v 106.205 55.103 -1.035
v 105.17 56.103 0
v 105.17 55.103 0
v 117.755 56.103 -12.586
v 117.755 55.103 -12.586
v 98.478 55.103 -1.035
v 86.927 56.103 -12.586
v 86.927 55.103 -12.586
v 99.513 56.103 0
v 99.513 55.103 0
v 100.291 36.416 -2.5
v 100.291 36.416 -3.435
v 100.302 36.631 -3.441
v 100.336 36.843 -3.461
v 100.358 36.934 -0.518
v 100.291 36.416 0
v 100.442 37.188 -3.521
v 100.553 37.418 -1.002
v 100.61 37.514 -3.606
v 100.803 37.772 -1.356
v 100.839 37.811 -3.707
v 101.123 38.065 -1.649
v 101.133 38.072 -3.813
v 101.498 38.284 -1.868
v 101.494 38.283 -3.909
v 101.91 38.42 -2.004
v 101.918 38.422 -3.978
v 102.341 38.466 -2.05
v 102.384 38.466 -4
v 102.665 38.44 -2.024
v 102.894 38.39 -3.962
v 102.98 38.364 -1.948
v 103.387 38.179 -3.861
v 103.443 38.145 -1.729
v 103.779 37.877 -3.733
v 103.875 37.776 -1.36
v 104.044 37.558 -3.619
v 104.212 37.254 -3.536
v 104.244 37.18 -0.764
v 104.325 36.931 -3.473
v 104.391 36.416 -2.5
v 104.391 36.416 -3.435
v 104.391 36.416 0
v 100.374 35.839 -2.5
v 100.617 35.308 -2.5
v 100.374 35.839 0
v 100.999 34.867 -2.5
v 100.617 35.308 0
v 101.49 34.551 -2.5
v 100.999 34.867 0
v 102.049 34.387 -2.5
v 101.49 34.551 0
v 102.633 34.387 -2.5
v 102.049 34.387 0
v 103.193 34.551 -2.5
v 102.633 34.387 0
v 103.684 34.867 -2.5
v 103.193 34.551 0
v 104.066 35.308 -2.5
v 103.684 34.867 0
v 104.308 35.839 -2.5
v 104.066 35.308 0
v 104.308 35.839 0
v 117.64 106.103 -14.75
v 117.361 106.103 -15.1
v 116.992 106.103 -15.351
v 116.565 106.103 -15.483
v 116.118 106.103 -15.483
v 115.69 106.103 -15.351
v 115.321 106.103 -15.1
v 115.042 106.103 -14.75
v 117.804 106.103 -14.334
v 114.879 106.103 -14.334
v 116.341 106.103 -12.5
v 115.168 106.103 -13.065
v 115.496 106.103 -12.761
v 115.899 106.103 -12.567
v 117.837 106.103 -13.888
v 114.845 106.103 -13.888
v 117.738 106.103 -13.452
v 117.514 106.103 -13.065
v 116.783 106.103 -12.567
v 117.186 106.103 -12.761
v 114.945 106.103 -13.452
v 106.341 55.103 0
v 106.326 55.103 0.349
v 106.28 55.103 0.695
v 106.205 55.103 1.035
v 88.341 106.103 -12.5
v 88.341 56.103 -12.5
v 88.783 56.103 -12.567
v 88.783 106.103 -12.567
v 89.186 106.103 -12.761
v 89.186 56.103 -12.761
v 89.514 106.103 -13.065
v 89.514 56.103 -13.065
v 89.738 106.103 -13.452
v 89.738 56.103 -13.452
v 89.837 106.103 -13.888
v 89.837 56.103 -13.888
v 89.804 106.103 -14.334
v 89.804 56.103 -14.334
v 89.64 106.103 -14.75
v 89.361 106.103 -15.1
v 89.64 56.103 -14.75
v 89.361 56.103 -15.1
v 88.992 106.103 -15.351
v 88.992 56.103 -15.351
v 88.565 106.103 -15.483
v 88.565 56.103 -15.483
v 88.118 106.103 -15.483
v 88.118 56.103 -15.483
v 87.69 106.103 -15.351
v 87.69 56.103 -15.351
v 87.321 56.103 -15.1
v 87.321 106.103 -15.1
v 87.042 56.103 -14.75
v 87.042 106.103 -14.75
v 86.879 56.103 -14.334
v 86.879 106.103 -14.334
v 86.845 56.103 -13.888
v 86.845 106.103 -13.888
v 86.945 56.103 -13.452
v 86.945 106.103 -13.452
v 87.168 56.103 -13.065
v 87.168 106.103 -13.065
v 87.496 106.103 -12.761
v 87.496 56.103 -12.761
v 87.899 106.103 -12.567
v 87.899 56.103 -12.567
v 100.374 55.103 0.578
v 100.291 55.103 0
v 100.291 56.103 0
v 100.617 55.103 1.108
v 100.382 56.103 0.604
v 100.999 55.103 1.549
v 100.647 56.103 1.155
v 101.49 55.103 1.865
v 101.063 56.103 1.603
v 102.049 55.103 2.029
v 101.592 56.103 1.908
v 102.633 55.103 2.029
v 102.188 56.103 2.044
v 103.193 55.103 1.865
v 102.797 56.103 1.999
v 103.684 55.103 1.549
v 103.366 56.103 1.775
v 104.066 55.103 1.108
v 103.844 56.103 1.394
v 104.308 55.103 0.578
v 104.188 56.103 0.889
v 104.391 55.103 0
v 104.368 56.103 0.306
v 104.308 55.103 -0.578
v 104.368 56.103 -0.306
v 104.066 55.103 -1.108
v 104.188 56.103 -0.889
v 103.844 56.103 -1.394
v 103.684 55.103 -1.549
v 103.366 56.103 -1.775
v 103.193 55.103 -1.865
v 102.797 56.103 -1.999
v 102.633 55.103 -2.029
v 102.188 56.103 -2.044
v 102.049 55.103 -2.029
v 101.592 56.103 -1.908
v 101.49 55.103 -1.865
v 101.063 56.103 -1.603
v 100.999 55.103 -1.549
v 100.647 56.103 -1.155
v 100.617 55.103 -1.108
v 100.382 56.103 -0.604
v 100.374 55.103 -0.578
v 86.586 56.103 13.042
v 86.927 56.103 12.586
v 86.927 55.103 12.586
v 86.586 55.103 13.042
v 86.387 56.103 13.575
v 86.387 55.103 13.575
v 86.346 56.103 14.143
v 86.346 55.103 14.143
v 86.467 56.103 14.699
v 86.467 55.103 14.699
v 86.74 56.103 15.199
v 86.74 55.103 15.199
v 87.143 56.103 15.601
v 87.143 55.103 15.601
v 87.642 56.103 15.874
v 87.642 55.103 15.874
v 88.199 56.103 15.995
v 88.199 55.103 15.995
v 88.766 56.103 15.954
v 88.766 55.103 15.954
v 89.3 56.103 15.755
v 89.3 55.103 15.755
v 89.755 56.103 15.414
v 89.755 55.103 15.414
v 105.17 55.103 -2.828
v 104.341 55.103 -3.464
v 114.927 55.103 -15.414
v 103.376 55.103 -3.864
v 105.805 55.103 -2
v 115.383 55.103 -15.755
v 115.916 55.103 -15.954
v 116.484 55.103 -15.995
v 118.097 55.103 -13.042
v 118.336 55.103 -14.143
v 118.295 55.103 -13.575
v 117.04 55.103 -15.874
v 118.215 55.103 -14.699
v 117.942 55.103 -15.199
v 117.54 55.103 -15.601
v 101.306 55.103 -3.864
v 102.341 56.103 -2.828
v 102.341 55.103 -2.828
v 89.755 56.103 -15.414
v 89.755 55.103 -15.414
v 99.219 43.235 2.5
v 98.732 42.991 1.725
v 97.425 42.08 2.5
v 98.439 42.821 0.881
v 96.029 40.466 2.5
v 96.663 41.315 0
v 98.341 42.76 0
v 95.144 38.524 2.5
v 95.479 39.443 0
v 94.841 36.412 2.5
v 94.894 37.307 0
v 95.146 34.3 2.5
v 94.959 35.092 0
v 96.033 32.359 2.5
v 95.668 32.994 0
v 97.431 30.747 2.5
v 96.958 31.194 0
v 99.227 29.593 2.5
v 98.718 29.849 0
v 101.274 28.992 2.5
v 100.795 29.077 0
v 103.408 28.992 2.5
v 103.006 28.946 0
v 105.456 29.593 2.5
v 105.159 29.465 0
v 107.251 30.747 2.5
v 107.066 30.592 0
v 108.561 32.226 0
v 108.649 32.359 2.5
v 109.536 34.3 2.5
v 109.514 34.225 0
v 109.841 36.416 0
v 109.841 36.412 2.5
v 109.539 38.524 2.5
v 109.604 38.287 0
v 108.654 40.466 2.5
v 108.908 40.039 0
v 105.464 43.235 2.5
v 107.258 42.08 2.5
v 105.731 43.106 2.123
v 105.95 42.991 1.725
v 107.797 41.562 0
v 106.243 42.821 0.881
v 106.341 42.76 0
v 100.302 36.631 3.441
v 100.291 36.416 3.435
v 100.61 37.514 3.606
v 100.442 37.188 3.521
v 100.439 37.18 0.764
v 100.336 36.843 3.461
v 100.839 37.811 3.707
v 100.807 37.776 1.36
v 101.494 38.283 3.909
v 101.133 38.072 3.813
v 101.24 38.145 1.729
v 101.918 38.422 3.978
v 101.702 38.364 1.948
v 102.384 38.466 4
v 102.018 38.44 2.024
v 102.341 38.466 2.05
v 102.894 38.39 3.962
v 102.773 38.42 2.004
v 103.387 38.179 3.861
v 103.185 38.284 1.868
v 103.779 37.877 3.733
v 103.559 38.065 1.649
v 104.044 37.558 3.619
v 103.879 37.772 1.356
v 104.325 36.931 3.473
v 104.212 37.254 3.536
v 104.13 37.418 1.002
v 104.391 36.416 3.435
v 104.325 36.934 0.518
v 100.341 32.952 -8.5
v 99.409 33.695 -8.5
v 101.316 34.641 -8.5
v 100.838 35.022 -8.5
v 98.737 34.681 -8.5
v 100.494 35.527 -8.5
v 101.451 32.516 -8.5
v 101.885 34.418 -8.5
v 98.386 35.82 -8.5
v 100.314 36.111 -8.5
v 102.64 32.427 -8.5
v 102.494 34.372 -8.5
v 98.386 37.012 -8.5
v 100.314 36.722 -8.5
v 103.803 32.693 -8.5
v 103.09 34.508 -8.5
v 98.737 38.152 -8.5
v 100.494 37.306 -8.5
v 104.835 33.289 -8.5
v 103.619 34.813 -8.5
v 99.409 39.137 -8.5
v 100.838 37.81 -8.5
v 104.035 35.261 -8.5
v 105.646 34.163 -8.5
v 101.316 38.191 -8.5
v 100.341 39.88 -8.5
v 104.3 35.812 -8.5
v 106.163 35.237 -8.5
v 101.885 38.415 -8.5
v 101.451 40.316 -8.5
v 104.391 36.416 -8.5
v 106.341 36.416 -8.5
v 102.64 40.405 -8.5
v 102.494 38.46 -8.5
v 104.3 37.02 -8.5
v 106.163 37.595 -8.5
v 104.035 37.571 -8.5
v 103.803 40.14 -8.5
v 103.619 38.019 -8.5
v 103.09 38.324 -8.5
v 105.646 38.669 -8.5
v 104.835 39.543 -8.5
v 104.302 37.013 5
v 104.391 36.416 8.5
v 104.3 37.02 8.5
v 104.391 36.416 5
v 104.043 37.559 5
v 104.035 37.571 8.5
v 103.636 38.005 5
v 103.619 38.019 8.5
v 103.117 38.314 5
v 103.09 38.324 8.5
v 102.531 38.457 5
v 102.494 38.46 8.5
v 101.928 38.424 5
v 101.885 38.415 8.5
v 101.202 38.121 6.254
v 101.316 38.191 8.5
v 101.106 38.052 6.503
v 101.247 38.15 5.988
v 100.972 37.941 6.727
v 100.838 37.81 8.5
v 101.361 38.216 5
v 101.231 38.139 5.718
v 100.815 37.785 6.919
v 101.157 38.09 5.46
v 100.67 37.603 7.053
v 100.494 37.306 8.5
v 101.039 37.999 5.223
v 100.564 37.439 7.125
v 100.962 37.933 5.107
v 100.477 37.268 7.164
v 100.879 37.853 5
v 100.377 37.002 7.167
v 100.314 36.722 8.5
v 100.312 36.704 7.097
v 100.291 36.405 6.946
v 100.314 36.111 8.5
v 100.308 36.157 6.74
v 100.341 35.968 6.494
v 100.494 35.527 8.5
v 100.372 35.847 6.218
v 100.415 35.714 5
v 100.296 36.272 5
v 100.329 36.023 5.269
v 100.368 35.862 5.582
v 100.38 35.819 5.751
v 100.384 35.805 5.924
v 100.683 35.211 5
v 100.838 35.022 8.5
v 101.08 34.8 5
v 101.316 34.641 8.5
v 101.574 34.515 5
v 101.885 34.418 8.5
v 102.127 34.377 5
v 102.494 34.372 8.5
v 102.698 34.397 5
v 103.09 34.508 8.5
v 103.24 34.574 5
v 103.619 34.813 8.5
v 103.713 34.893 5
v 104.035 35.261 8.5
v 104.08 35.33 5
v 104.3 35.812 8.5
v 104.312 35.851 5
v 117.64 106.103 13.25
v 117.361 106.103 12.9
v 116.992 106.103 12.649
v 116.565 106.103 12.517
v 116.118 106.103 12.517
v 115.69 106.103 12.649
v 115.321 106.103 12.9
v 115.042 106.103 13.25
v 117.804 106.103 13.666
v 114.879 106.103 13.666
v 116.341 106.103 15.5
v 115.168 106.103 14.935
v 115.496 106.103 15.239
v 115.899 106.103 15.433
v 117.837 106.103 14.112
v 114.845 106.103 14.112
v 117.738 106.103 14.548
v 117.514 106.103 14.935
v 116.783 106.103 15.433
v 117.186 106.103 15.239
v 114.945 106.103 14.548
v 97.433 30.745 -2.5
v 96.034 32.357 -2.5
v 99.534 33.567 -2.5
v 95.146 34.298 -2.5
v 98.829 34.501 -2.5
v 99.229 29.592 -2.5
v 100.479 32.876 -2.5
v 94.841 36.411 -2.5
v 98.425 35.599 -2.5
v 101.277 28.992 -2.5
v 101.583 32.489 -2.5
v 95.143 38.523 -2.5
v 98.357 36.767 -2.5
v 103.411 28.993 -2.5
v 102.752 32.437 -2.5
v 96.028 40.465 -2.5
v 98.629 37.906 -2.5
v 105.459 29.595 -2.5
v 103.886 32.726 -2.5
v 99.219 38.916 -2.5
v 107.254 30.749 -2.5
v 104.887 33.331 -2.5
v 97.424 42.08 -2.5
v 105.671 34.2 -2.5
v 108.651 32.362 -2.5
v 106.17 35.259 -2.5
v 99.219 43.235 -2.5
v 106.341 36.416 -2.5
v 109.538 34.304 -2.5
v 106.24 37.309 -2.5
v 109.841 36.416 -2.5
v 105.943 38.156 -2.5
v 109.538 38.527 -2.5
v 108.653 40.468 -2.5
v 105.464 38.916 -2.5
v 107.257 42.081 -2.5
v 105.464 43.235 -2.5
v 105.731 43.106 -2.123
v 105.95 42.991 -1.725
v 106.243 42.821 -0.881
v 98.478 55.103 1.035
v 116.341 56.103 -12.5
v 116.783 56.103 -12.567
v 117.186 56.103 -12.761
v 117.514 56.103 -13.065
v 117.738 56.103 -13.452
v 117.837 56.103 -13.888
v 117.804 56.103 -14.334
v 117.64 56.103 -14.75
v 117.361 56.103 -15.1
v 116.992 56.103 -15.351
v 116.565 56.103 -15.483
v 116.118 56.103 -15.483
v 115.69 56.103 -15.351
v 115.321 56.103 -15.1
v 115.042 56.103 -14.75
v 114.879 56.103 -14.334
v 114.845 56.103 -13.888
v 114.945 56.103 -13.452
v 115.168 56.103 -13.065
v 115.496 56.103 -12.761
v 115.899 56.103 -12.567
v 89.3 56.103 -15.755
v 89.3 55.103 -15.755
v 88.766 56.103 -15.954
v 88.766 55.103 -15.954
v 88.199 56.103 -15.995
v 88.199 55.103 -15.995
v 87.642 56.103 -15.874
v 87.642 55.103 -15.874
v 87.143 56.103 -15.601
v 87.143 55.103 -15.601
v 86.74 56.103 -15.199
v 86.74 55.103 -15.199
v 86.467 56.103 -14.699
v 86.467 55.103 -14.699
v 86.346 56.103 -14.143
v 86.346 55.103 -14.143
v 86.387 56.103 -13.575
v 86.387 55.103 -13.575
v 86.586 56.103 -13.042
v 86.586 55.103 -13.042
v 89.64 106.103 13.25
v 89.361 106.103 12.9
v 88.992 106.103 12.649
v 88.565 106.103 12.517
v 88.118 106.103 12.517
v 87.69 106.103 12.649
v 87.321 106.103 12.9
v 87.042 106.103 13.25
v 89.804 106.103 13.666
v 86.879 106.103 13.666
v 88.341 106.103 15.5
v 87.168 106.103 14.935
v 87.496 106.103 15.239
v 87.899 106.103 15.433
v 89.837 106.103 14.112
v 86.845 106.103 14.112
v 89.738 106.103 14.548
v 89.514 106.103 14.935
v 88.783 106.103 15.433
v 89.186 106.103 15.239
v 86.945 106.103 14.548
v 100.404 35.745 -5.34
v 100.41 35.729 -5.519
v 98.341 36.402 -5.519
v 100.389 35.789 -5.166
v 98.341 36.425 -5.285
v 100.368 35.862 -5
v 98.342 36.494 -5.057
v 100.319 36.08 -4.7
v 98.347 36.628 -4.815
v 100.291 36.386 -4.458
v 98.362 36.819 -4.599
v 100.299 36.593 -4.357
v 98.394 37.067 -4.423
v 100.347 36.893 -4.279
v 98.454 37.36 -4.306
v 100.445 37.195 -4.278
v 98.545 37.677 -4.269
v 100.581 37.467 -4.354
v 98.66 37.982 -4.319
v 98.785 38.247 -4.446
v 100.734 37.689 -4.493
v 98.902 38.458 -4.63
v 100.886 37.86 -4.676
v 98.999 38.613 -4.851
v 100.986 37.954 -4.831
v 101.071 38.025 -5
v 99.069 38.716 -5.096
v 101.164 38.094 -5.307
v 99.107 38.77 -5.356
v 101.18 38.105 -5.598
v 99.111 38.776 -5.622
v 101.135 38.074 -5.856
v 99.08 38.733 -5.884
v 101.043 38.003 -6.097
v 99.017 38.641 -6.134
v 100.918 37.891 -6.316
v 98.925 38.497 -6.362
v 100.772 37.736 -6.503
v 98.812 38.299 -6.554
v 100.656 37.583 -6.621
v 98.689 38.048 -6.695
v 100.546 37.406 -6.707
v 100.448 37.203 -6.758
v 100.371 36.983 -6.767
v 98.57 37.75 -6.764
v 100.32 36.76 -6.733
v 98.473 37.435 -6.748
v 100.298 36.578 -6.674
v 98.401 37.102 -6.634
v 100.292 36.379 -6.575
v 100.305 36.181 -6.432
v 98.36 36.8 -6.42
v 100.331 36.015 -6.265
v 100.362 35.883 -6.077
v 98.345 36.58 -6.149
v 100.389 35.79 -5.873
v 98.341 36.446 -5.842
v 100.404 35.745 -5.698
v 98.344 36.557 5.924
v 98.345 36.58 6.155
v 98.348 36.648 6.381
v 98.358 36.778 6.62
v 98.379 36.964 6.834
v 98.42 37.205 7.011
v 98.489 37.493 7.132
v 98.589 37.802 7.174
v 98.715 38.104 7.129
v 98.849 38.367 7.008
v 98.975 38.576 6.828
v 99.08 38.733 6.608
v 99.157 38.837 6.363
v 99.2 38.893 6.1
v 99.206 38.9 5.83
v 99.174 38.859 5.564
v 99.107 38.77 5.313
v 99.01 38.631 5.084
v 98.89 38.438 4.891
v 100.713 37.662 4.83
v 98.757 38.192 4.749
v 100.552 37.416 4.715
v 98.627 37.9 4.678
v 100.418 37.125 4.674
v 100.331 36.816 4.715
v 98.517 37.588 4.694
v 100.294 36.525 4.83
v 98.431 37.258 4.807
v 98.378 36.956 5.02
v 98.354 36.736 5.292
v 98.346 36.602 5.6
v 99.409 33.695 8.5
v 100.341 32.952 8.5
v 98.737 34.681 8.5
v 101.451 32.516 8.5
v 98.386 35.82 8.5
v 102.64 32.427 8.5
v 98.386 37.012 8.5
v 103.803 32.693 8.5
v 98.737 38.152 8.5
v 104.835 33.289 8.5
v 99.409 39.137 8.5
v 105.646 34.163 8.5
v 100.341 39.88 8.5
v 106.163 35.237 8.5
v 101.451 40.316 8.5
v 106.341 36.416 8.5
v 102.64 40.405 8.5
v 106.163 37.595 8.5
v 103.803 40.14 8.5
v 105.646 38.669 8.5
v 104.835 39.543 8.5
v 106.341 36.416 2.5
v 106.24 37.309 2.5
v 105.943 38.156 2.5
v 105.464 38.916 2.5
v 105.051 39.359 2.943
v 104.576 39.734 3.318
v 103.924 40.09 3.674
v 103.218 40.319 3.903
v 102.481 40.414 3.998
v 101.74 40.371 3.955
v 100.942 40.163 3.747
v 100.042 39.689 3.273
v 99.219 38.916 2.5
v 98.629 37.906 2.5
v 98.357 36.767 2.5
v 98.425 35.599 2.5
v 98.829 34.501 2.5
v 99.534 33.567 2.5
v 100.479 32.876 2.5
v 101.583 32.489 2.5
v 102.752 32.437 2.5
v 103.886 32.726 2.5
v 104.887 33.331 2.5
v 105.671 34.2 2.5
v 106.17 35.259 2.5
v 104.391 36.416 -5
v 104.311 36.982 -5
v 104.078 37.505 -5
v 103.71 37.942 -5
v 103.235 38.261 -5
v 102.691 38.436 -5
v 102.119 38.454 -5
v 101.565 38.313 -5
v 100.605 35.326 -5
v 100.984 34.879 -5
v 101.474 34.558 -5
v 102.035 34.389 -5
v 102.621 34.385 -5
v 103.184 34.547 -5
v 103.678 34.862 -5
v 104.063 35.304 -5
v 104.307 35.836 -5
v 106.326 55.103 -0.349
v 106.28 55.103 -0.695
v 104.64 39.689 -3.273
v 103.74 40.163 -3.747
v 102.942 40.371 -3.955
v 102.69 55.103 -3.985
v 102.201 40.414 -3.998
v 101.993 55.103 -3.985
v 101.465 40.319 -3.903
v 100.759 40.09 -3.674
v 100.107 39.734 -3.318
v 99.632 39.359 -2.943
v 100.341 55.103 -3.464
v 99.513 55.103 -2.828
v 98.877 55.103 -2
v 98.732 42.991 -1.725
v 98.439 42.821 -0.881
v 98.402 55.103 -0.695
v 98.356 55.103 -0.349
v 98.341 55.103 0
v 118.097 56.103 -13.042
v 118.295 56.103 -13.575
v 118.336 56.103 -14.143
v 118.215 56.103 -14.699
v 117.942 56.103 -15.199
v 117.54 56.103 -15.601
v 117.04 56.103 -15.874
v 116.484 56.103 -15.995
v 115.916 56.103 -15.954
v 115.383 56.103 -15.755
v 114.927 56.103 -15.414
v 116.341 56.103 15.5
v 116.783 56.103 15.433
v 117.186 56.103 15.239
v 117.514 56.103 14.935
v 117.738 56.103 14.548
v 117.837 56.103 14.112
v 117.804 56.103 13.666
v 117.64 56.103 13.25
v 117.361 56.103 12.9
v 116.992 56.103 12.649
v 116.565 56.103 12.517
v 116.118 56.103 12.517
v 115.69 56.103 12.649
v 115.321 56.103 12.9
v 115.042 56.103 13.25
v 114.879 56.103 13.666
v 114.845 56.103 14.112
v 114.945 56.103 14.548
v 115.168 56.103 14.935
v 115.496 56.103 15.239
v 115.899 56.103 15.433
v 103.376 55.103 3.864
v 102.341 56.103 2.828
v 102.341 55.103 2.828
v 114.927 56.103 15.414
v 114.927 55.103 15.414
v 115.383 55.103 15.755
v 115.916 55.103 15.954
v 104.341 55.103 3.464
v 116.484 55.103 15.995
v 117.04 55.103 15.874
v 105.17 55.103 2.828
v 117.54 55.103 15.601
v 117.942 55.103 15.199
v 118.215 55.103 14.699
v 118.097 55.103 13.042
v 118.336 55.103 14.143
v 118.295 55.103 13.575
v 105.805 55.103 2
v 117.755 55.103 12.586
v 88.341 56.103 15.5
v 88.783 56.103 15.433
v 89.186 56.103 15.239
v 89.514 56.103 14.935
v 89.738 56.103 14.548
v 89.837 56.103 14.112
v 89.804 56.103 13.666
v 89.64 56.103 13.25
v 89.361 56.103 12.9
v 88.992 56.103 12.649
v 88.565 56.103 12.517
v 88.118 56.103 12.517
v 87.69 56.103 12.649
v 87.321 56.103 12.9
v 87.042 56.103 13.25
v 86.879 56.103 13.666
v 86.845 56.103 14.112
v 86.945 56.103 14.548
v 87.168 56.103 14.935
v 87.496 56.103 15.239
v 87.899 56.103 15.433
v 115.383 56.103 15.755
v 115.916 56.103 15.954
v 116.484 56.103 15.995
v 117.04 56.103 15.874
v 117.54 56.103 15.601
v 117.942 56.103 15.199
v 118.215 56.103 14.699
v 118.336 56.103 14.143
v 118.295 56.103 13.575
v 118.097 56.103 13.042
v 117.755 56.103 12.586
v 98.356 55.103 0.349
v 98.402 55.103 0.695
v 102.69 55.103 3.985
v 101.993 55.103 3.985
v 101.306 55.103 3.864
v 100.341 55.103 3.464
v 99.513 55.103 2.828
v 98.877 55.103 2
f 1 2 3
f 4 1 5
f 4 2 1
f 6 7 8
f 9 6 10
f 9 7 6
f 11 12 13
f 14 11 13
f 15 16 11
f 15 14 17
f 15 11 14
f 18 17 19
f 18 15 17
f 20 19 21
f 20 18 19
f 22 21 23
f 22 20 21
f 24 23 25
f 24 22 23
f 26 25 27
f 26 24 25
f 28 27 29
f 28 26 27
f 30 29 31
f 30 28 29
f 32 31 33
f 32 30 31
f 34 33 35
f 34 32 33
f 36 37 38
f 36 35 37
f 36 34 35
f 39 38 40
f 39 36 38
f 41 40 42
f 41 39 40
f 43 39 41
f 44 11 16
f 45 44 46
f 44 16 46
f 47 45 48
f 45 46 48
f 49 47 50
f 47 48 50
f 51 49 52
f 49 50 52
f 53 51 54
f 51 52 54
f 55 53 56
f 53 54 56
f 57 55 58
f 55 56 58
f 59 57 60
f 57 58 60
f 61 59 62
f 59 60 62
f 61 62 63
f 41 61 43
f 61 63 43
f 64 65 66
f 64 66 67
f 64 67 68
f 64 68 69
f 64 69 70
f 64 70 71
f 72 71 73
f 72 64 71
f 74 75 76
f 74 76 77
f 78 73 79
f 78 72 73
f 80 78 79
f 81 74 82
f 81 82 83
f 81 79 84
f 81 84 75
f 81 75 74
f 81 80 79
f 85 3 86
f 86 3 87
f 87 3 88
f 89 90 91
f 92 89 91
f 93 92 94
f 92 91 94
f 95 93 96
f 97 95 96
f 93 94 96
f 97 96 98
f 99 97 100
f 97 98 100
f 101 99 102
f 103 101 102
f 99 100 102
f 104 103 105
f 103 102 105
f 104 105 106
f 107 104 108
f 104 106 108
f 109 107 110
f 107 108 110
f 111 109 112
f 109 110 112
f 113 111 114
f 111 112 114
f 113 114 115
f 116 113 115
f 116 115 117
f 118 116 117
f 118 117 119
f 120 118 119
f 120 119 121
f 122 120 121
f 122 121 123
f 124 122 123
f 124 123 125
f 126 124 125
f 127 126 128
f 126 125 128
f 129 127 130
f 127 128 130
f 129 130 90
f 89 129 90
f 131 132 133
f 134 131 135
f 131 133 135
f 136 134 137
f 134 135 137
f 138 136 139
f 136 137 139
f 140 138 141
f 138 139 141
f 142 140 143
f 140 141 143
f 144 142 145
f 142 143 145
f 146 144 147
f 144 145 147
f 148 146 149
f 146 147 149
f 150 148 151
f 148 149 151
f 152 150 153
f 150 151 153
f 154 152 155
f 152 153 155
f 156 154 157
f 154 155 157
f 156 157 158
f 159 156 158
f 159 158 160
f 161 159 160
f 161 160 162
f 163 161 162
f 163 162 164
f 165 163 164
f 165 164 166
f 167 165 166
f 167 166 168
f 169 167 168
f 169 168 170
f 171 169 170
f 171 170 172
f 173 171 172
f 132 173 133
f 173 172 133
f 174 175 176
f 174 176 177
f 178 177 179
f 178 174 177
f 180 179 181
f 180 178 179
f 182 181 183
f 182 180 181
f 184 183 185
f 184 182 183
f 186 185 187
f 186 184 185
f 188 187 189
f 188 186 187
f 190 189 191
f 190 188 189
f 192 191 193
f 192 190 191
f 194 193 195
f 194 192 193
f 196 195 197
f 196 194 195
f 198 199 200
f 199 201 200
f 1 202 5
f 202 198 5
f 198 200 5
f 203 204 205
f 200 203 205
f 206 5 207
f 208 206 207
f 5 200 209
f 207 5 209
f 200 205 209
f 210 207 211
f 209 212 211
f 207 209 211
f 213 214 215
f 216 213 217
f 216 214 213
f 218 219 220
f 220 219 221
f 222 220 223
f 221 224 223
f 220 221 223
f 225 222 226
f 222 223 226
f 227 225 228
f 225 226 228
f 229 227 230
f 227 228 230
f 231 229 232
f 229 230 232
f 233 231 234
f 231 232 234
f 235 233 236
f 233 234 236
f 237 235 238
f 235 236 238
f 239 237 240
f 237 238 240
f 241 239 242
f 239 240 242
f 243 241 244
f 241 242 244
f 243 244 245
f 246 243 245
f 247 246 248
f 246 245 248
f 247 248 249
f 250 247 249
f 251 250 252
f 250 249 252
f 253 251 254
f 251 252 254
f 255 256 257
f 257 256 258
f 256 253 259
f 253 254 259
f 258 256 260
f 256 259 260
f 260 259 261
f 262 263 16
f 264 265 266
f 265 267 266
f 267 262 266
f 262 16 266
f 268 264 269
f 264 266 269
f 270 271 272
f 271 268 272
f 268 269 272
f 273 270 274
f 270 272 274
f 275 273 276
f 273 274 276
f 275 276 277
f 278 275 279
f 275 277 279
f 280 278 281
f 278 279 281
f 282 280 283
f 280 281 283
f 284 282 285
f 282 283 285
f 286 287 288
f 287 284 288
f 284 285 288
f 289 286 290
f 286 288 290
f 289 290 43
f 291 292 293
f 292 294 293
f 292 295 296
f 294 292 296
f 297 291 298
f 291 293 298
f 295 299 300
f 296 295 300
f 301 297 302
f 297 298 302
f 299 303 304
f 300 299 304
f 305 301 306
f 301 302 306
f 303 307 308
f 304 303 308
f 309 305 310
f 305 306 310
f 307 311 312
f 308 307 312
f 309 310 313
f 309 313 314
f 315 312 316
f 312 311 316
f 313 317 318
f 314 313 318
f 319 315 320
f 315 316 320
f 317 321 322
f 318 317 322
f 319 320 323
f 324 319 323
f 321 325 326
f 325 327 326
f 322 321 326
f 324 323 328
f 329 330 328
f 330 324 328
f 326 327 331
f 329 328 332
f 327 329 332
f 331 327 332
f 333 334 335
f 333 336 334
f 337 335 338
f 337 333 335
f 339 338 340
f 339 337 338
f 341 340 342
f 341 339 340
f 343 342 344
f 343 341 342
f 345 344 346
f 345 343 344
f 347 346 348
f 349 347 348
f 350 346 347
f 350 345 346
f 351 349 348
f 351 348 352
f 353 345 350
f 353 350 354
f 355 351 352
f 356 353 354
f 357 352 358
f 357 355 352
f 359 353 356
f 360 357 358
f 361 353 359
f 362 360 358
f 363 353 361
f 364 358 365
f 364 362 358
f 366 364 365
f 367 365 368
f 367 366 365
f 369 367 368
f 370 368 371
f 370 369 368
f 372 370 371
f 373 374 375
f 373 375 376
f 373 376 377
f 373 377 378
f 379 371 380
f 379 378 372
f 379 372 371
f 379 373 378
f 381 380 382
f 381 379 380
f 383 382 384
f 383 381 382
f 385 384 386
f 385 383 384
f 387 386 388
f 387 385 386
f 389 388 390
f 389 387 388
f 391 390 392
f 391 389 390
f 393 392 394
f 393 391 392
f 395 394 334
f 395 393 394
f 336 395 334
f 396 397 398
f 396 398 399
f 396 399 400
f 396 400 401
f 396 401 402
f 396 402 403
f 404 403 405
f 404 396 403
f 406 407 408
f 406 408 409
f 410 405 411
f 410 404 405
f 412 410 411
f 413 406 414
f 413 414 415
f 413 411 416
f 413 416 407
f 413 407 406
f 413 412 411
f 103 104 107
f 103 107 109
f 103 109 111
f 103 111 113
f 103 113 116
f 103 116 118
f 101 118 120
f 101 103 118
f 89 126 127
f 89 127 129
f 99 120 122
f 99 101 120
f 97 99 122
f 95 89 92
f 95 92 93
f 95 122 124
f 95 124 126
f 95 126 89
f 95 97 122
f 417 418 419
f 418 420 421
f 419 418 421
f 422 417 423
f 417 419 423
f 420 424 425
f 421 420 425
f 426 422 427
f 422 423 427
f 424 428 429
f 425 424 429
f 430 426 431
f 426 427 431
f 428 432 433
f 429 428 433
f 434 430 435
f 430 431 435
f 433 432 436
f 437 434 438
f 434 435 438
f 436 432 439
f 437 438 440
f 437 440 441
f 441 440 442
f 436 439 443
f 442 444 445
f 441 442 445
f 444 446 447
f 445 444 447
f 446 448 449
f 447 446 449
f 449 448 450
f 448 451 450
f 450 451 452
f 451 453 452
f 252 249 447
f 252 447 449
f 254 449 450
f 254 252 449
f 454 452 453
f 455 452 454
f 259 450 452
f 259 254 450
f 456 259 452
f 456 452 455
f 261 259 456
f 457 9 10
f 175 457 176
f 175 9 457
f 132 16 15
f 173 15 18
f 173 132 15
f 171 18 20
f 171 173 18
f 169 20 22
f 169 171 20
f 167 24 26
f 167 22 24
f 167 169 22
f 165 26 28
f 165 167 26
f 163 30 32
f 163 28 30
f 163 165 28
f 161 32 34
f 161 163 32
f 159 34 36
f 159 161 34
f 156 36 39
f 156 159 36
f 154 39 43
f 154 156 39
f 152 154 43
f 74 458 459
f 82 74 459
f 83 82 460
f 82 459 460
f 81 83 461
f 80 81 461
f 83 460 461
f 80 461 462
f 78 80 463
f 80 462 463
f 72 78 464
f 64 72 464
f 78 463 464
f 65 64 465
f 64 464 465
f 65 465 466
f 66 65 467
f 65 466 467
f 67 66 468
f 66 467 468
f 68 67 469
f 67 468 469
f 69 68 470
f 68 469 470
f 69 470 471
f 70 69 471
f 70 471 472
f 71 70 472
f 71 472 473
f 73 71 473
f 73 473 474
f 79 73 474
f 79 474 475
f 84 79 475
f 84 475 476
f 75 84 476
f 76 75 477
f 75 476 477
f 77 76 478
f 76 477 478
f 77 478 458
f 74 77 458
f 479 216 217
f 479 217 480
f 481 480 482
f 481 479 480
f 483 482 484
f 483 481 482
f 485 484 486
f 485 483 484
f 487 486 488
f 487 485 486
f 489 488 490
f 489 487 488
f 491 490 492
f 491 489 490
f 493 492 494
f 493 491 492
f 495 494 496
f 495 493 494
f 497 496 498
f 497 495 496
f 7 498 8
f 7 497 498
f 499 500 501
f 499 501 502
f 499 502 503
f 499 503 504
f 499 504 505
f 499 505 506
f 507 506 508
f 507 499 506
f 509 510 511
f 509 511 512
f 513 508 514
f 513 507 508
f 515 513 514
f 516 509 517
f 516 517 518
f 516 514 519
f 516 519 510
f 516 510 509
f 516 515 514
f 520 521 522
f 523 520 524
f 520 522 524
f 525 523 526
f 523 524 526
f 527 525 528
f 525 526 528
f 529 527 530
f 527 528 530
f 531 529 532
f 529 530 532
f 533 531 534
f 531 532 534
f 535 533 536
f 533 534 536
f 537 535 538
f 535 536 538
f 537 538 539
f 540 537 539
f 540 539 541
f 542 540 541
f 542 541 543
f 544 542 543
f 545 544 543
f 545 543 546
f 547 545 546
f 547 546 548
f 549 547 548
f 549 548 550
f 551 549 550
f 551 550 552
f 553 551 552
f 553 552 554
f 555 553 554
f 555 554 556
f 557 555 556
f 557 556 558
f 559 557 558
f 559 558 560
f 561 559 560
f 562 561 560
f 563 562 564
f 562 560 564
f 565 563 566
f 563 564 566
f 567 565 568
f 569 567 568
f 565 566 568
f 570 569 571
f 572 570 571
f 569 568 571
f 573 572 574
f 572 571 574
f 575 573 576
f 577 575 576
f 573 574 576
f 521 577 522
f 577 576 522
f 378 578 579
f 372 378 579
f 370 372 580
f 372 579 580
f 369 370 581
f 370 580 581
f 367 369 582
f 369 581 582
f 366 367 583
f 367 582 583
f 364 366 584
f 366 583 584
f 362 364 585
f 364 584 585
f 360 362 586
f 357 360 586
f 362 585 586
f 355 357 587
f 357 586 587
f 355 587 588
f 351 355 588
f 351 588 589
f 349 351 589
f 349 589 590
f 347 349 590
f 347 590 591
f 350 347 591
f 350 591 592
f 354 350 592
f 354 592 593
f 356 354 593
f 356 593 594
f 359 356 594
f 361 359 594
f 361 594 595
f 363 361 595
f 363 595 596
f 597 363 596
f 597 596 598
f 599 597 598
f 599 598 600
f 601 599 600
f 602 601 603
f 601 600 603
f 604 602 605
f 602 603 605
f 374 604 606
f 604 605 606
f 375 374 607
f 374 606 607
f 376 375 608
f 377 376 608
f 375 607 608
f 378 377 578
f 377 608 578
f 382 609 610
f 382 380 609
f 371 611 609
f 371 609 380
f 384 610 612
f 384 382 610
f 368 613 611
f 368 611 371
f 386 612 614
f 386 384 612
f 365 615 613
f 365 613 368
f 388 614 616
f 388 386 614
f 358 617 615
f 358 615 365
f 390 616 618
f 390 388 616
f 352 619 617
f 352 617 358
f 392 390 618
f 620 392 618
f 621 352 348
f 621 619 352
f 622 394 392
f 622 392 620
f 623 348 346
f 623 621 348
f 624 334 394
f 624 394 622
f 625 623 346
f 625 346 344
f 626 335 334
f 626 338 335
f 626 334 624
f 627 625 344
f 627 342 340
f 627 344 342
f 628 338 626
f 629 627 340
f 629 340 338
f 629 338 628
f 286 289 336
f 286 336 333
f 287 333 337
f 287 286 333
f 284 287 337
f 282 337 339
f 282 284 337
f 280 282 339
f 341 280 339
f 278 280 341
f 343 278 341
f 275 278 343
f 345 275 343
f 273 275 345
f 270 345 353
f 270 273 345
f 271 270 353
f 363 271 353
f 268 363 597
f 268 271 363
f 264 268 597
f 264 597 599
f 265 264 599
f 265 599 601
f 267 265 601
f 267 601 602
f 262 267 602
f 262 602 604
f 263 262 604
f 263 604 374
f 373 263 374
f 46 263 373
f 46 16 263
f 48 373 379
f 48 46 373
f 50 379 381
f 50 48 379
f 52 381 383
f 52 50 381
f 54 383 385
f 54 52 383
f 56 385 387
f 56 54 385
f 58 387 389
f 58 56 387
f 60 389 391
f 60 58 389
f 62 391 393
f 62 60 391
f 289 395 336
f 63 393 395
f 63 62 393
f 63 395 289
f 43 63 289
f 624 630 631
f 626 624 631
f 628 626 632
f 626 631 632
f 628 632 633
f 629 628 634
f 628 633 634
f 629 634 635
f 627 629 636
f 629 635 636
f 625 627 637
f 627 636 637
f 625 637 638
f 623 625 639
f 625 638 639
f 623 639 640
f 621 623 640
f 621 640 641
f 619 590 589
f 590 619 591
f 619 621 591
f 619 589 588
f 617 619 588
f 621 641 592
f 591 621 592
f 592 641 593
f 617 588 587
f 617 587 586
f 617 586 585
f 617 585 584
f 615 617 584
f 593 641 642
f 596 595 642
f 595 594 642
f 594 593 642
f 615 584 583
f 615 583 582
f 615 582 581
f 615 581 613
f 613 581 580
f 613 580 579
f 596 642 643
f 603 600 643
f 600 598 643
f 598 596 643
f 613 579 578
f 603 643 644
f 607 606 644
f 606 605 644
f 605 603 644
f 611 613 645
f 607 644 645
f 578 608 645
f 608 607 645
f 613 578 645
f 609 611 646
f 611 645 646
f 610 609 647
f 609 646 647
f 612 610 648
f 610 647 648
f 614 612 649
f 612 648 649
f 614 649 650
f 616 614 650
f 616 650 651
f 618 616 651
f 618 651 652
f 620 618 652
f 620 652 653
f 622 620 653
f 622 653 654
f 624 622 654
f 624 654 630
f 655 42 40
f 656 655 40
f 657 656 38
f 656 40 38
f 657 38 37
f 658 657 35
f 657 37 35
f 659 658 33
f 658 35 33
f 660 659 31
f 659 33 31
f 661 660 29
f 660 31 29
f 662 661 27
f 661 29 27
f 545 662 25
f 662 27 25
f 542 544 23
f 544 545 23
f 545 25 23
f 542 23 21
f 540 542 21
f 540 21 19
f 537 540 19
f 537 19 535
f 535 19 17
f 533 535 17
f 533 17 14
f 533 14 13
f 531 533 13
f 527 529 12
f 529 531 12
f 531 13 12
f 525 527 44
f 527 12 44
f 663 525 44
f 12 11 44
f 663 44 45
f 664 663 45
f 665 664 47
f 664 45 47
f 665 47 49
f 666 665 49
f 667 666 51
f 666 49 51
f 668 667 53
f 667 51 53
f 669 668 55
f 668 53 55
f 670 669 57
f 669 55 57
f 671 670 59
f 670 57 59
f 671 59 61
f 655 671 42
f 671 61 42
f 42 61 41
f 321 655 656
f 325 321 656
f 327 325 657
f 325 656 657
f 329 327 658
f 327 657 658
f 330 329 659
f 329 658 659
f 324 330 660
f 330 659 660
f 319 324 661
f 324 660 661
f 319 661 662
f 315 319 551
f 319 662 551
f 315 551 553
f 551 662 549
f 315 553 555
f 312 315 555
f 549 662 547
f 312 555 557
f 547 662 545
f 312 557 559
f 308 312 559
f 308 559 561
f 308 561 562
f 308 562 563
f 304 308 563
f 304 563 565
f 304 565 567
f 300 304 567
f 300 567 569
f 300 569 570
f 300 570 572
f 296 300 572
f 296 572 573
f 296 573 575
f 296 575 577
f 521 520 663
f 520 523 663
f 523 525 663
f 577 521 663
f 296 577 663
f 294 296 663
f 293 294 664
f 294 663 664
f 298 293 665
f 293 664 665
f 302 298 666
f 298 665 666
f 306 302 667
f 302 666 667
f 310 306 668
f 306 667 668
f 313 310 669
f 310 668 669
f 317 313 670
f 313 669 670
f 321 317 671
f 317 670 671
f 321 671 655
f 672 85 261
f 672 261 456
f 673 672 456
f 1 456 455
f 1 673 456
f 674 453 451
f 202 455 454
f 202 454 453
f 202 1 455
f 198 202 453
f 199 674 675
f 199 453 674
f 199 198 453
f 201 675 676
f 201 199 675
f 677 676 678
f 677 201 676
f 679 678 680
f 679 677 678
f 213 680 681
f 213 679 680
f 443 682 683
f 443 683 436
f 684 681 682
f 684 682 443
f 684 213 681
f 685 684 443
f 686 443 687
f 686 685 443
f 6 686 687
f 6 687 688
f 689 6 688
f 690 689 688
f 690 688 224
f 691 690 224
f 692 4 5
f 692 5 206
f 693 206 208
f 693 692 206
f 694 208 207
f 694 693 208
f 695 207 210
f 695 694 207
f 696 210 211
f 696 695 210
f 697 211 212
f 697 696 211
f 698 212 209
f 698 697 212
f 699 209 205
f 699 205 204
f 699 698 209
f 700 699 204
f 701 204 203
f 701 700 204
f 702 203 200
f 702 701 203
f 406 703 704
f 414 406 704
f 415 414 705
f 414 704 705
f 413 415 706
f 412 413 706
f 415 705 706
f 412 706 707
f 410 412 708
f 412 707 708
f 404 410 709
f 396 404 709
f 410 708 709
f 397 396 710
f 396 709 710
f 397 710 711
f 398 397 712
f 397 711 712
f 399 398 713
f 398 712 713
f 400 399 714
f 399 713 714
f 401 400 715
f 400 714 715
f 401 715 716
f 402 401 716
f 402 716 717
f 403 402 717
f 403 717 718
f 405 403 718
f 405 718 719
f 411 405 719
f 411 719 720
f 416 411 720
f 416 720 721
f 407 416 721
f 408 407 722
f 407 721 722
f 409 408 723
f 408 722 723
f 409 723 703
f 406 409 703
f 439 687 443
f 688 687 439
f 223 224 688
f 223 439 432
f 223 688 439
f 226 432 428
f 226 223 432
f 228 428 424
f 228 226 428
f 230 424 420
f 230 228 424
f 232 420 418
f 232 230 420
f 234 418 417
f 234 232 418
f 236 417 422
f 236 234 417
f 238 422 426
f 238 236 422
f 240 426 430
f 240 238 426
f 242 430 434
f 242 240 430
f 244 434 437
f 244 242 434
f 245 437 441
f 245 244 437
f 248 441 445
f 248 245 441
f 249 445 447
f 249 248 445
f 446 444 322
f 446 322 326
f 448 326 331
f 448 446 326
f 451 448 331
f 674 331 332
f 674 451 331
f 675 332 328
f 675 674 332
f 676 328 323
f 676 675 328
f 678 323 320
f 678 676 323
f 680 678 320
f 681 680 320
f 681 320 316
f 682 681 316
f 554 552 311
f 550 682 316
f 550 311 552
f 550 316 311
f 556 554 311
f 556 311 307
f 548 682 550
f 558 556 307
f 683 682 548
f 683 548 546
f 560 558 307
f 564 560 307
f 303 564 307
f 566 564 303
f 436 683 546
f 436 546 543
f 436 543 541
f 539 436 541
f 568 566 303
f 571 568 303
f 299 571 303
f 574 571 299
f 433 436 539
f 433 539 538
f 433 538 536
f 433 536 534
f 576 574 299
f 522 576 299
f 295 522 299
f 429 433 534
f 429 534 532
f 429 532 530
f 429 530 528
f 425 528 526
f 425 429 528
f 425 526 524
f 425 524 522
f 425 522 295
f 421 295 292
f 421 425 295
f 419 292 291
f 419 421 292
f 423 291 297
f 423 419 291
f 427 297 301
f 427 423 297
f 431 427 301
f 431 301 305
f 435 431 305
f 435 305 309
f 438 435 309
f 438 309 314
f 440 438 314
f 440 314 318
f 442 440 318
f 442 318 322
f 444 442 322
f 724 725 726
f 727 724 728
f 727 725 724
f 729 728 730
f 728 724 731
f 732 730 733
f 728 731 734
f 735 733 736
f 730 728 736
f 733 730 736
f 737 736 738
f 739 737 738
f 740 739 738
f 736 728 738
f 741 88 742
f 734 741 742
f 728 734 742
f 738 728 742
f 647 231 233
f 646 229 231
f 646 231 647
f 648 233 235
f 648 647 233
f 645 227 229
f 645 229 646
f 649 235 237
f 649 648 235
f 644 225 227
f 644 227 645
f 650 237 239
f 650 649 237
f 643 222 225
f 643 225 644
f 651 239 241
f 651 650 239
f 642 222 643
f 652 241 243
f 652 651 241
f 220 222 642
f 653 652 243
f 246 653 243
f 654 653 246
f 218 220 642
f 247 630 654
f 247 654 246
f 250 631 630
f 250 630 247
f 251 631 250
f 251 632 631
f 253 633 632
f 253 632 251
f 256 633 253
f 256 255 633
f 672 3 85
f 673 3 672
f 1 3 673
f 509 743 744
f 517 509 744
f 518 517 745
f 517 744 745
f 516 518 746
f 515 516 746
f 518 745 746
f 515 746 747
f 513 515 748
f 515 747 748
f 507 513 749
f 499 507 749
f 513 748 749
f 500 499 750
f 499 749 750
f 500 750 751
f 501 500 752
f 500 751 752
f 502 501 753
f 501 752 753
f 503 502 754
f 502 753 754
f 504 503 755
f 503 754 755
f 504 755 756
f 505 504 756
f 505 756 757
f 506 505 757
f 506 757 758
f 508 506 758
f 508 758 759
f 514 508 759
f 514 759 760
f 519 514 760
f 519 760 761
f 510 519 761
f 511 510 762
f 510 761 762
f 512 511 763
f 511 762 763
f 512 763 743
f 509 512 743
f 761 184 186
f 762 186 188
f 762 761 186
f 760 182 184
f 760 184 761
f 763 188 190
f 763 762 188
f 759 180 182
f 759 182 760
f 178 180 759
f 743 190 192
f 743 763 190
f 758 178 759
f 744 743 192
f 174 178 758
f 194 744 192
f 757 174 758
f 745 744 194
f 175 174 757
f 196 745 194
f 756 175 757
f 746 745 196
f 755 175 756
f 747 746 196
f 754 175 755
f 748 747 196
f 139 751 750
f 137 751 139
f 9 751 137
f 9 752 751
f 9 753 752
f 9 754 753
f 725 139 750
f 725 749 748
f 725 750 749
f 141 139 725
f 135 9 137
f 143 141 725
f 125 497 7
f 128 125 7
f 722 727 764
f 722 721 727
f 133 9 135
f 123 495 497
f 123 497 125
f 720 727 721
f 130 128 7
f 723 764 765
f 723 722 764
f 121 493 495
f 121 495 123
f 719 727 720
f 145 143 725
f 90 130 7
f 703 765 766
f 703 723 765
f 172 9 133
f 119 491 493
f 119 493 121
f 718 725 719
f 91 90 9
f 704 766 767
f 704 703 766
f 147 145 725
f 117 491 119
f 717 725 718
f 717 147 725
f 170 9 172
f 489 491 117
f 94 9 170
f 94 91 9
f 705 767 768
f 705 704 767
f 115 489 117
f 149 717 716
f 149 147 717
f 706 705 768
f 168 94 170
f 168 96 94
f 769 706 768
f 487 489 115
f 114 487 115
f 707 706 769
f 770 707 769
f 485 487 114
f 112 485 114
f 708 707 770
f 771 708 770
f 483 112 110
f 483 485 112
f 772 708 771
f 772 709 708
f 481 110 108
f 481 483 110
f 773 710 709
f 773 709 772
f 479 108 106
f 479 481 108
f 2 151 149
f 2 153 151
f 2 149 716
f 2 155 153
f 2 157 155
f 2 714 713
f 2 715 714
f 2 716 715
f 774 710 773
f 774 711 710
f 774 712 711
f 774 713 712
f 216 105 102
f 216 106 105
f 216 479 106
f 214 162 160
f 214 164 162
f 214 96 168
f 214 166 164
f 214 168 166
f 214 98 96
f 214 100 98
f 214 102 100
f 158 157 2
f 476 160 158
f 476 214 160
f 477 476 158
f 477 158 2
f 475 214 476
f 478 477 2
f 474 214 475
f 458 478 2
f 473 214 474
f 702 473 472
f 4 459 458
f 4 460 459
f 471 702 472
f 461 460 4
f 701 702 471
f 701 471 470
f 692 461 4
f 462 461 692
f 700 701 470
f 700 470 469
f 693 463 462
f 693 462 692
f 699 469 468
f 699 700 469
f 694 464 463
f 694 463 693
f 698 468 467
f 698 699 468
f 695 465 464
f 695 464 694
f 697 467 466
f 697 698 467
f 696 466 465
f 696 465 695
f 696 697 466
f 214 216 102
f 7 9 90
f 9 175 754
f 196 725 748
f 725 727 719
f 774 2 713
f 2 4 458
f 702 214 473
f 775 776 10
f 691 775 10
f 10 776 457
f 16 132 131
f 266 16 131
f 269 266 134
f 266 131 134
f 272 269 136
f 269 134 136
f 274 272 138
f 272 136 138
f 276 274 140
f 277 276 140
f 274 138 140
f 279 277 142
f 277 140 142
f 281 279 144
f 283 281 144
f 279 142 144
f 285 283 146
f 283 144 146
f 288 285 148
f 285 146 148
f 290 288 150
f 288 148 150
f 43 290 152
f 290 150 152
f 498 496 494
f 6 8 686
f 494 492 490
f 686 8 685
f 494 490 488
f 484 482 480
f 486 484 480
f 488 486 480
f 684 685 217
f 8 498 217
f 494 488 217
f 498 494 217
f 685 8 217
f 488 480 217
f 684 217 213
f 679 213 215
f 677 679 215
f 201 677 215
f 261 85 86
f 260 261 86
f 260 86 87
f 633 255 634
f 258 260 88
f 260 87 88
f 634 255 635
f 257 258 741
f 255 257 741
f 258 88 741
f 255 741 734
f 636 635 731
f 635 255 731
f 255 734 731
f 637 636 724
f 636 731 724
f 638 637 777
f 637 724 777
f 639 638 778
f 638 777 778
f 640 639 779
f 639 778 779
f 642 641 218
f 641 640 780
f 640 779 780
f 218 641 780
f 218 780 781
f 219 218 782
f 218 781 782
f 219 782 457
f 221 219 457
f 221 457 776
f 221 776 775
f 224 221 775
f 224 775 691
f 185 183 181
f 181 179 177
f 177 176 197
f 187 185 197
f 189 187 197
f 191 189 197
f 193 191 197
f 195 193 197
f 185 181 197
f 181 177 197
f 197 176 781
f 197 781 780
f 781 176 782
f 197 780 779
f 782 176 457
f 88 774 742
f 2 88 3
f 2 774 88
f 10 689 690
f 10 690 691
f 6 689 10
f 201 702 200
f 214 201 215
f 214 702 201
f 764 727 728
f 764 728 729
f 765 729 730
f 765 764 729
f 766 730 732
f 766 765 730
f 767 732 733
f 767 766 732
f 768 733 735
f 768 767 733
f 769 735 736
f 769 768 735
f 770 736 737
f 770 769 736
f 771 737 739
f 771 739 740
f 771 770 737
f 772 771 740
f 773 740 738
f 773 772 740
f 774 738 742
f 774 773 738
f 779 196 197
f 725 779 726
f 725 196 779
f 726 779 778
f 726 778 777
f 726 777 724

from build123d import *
from build123d.topology import SkipClean

# Parameters (mm, degrees)
SKETCH1_R                           = 7.5
SKETCH1_R_2                         = 2.05
BOSS_EXTRUDE1_DEPTH                 = 2.5
SKETCH2_R                           = 4
SKETCH2_R_2                         = 2.05
BOSS_EXTRUDE2_DEPTH                 = 6
SKETCH7_W                           = 4
SKETCH7_H                           = 18.687164731
REVOLVE7_ANGLE                      = 180
SKETCH8_W                           = 2.05
SKETCH8_H                           = 18.687164731
SKETCH9_R                           = 2.05
CUT_EXTRUDE1_DEPTH                  = 5
BOSS_EXTRUDE3_START                 = 1
SKETCH10_R                          = 2.05
BOSS_EXTRUDE3_DEPTH                 = 1
SKETCH11_R                          = 1.5
BOSS_EXTRUDE4_DEPTH                 = 50
M3X0_5_TAPPED_HOLE1_REACH           = 76.406
M3X0_5_TAPPED_HOLE1_BORE_R          = 1.25
M3X0_5_TAPPED_HOLE1_ON_FACE_2_REACH = 76.436
M3X0_5_TAPPED_HOLE1_BORE_2_R        = 1.25


with BuildPart() as part:
    # Sketch1 → Boss-Extrude1 (new body)
    with BuildSketch(Plane.XY):
        with Locations((102.341205301, 36.416113389)):
            Circle(SKETCH1_R)
        with Locations((102.341205301, 36.416113389)):
            Circle(SKETCH1_R_2, mode=Mode.SUBTRACT)
    boss_extrude1 = extrude(amount=BOSS_EXTRUDE1_DEPTH)

    # Sketch2 → Boss-Extrude2 (add)
    with BuildSketch(Plane.XY.offset(2.5)):
        with Locations((102.341205301, 36.416113389)):
            Circle(SKETCH2_R)
        with Locations((102.341205301, 36.416113389)):
            Circle(SKETCH2_R_2, mode=Mode.SUBTRACT)
    boss_extrude2 = extrude(amount=BOSS_EXTRUDE2_DEPTH)

    # Sketch7 → Revolve7 (revolve)
    with BuildSketch(Plane(origin=(0, 0, 0), x_dir=(-1, 0, 0), z_dir=(0, 0, -1))):
        with Locations((-104.341205301, 45.759695755)):
            Rectangle(SKETCH7_W, SKETCH7_H)
    revolve7 = revolve(axis=Axis((102.341205301, 36.416113389, 0), (0, -1, 0)), revolution_arc=REVOLVE7_ANGLE)

    # Sketch8 → Cut-Revolve2 (revolve, cut)
    with BuildSketch(Plane(origin=(0, 0, 0), x_dir=(-1, 0, 0), z_dir=(0, 0, -1))):
        with Locations((-103.366205301, 45.759695755)):
            Rectangle(SKETCH8_W, SKETCH8_H)
    cut_revolve2 = revolve(axis=Axis((102.341205301, 36.416113389, 0), (0, 1, 0)), mode=Mode.SUBTRACT)

    # Sketch9 → Cut-Extrude1 (cut)
    with SkipClean():  # the faces are left unmerged after this step: merging them gives an invalid solid
        with BuildSketch(Plane(origin=(0, 0, 0), x_dir=(-1, 0, 0), z_dir=(0, 0, -1))):
            with Locations(Location((-102.341205301, 36.416113389, 0), (0, 0, 180))):
                Circle(SKETCH9_R)
        cut_extrude1 = extrude(amount=-CUT_EXTRUDE1_DEPTH, mode=Mode.SUBTRACT)

    # Mirror1: Boss-Extrude1, Boss-Extrude2, Revolve7, Cut-Revolve2, Cut-Extrude1 across plane
    with SkipClean():  # the faces are left unmerged after this step: merging them gives an invalid solid
        add(boss_extrude1.mirror(Plane(origin=(102.341205301, 36.416113389, 0), x_dir=(1, 0, 0), z_dir=(0, 0, 1))))
        add(boss_extrude2.mirror(Plane(origin=(102.341205301, 36.416113389, 0), x_dir=(1, 0, 0), z_dir=(0, 0, 1))))
        add(revolve7.mirror(Plane(origin=(102.341205301, 36.416113389, 0), x_dir=(1, 0, 0), z_dir=(0, 0, 1))))
        add(cut_revolve2.mirror(Plane(origin=(102.341205301, 36.416113389, 0), x_dir=(1, 0, 0), z_dir=(0, 0, 1))), mode=Mode.SUBTRACT)
        add(cut_extrude1.mirror(Plane(origin=(102.341205301, 36.416113389, 0), x_dir=(1, 0, 0), z_dir=(0, 0, 1))), mode=Mode.SUBTRACT)

    # Sketch10 → Boss-Extrude3 (add)
    with BuildSketch(Plane(origin=(0, 55.10327812, 0), x_dir=(1, 0, 0), z_dir=(0, 1, 0)).offset(BOSS_EXTRUDE3_START)):
        with BuildLine():
            Line((102.341205301, 2.828427125), (89.755418863, 15.414213562))
            ThreePointArc((89.755418863, 15.414213562), (86.926991738, 15.414213562), (86.926991738, 12.585786438))
            Line((86.926991738, 12.585786438), (99.512778176, 0))
            Line((99.512778176, 0), (86.926991738, -12.585786438))
            ThreePointArc((86.926991738, -12.585786438), (86.926991738, -15.414213562), (89.755418863, -15.414213562))
            Line((89.755418863, -15.414213562), (102.341205301, -2.828427125))
            Line((102.341205301, -2.828427125), (114.926991738, -15.414213562))
            ThreePointArc((114.926991738, -15.414213562), (117.755418863, -15.414213562), (117.755418863, -12.585786438))
            Line((117.755418863, -12.585786438), (105.169632425, 0))
            Line((105.169632425, 0), (117.755418863, 12.585786438))
            ThreePointArc((117.755418863, 12.585786438), (117.755418863, 15.414213562), (114.926991738, 15.414213562))
            Line((114.926991738, 15.414213562), (102.341205301, 2.828427125))
        make_face()
        with Locations(Location((102.341205301, 0, 0), (0, 0, 180))):
            Circle(SKETCH10_R, mode=Mode.SUBTRACT)
    extrude(amount=-BOSS_EXTRUDE3_DEPTH)

    # Sketch11 → Boss-Extrude4 (add)
    with BuildSketch(Plane(origin=(0, 56.10327812, 0), x_dir=(1, 0, 0), z_dir=(0, 1, 0))):
        with Locations(Location((88.341205301, 14, 0), (0, 0, 270))):
            Circle(SKETCH11_R)
        with Locations(Location((116.341205301, 14, 0), (0, 0, 270))):
            Circle(SKETCH11_R)
        with Locations(Location((116.341205301, -14, 0), (0, 0, 270))):
            Circle(SKETCH11_R)
        with Locations(Location((88.341205301, -14, 0), (0, 0, 270))):
            Circle(SKETCH11_R)
    extrude(amount=BOSS_EXTRUDE4_DEPTH)

    # M3x0.5 Tapped Hole1 bore (on position points) → M3x0.5 Tapped Hole1 (cut, up to next)
    with BuildSketch(Plane(origin=(98.587954415, 37.799264786, 5.923678009), x_dir=(-0.345787849288, -0.938312721477, 0), z_dir=(-0.938312721477, 0.345787849288, 0)), mode=Mode.PRIVATE) as m3x0_5_tapped_hole1_sk1:
        Circle(M3X0_5_TAPPED_HOLE1_BORE_R)
    m3x0_5_tapped_hole1_tool1 = extrude(m3x0_5_tapped_hole1_sk1.sketch, amount=-M3X0_5_TAPPED_HOLE1_REACH, mode=Mode.PRIVATE) & part.part
    add(m3x0_5_tapped_hole1_tool1.solids().sort_by_distance((98.587954, 37.799265, 5.923678))[0], mode=Mode.SUBTRACT)

    # M3x0.5 Tapped Hole1 bore 2 (on position points) → M3x0.5 Tapped Hole1 on face 2 (cut, up to next)
    with BuildSketch(Plane(origin=(98.537036141, 37.652356489, -5.51866452), x_dir=(-0.309061063746, -0.95104219616, 0), z_dir=(-0.95104219616, 0.309061063746, 0)), mode=Mode.PRIVATE) as m3x0_5_tapped_hole1_on_face_2_sk1:
        Circle(M3X0_5_TAPPED_HOLE1_BORE_2_R)
    m3x0_5_tapped_hole1_on_face_2_tool1 = extrude(m3x0_5_tapped_hole1_on_face_2_sk1.sketch, amount=-M3X0_5_TAPPED_HOLE1_ON_FACE_2_REACH, mode=Mode.PRIVATE) & part.part
    add(m3x0_5_tapped_hole1_on_face_2_tool1.solids().sort_by_distance((98.537036, 37.652356, -5.518665))[0], mode=Mode.SUBTRACT)


solid = part.part
